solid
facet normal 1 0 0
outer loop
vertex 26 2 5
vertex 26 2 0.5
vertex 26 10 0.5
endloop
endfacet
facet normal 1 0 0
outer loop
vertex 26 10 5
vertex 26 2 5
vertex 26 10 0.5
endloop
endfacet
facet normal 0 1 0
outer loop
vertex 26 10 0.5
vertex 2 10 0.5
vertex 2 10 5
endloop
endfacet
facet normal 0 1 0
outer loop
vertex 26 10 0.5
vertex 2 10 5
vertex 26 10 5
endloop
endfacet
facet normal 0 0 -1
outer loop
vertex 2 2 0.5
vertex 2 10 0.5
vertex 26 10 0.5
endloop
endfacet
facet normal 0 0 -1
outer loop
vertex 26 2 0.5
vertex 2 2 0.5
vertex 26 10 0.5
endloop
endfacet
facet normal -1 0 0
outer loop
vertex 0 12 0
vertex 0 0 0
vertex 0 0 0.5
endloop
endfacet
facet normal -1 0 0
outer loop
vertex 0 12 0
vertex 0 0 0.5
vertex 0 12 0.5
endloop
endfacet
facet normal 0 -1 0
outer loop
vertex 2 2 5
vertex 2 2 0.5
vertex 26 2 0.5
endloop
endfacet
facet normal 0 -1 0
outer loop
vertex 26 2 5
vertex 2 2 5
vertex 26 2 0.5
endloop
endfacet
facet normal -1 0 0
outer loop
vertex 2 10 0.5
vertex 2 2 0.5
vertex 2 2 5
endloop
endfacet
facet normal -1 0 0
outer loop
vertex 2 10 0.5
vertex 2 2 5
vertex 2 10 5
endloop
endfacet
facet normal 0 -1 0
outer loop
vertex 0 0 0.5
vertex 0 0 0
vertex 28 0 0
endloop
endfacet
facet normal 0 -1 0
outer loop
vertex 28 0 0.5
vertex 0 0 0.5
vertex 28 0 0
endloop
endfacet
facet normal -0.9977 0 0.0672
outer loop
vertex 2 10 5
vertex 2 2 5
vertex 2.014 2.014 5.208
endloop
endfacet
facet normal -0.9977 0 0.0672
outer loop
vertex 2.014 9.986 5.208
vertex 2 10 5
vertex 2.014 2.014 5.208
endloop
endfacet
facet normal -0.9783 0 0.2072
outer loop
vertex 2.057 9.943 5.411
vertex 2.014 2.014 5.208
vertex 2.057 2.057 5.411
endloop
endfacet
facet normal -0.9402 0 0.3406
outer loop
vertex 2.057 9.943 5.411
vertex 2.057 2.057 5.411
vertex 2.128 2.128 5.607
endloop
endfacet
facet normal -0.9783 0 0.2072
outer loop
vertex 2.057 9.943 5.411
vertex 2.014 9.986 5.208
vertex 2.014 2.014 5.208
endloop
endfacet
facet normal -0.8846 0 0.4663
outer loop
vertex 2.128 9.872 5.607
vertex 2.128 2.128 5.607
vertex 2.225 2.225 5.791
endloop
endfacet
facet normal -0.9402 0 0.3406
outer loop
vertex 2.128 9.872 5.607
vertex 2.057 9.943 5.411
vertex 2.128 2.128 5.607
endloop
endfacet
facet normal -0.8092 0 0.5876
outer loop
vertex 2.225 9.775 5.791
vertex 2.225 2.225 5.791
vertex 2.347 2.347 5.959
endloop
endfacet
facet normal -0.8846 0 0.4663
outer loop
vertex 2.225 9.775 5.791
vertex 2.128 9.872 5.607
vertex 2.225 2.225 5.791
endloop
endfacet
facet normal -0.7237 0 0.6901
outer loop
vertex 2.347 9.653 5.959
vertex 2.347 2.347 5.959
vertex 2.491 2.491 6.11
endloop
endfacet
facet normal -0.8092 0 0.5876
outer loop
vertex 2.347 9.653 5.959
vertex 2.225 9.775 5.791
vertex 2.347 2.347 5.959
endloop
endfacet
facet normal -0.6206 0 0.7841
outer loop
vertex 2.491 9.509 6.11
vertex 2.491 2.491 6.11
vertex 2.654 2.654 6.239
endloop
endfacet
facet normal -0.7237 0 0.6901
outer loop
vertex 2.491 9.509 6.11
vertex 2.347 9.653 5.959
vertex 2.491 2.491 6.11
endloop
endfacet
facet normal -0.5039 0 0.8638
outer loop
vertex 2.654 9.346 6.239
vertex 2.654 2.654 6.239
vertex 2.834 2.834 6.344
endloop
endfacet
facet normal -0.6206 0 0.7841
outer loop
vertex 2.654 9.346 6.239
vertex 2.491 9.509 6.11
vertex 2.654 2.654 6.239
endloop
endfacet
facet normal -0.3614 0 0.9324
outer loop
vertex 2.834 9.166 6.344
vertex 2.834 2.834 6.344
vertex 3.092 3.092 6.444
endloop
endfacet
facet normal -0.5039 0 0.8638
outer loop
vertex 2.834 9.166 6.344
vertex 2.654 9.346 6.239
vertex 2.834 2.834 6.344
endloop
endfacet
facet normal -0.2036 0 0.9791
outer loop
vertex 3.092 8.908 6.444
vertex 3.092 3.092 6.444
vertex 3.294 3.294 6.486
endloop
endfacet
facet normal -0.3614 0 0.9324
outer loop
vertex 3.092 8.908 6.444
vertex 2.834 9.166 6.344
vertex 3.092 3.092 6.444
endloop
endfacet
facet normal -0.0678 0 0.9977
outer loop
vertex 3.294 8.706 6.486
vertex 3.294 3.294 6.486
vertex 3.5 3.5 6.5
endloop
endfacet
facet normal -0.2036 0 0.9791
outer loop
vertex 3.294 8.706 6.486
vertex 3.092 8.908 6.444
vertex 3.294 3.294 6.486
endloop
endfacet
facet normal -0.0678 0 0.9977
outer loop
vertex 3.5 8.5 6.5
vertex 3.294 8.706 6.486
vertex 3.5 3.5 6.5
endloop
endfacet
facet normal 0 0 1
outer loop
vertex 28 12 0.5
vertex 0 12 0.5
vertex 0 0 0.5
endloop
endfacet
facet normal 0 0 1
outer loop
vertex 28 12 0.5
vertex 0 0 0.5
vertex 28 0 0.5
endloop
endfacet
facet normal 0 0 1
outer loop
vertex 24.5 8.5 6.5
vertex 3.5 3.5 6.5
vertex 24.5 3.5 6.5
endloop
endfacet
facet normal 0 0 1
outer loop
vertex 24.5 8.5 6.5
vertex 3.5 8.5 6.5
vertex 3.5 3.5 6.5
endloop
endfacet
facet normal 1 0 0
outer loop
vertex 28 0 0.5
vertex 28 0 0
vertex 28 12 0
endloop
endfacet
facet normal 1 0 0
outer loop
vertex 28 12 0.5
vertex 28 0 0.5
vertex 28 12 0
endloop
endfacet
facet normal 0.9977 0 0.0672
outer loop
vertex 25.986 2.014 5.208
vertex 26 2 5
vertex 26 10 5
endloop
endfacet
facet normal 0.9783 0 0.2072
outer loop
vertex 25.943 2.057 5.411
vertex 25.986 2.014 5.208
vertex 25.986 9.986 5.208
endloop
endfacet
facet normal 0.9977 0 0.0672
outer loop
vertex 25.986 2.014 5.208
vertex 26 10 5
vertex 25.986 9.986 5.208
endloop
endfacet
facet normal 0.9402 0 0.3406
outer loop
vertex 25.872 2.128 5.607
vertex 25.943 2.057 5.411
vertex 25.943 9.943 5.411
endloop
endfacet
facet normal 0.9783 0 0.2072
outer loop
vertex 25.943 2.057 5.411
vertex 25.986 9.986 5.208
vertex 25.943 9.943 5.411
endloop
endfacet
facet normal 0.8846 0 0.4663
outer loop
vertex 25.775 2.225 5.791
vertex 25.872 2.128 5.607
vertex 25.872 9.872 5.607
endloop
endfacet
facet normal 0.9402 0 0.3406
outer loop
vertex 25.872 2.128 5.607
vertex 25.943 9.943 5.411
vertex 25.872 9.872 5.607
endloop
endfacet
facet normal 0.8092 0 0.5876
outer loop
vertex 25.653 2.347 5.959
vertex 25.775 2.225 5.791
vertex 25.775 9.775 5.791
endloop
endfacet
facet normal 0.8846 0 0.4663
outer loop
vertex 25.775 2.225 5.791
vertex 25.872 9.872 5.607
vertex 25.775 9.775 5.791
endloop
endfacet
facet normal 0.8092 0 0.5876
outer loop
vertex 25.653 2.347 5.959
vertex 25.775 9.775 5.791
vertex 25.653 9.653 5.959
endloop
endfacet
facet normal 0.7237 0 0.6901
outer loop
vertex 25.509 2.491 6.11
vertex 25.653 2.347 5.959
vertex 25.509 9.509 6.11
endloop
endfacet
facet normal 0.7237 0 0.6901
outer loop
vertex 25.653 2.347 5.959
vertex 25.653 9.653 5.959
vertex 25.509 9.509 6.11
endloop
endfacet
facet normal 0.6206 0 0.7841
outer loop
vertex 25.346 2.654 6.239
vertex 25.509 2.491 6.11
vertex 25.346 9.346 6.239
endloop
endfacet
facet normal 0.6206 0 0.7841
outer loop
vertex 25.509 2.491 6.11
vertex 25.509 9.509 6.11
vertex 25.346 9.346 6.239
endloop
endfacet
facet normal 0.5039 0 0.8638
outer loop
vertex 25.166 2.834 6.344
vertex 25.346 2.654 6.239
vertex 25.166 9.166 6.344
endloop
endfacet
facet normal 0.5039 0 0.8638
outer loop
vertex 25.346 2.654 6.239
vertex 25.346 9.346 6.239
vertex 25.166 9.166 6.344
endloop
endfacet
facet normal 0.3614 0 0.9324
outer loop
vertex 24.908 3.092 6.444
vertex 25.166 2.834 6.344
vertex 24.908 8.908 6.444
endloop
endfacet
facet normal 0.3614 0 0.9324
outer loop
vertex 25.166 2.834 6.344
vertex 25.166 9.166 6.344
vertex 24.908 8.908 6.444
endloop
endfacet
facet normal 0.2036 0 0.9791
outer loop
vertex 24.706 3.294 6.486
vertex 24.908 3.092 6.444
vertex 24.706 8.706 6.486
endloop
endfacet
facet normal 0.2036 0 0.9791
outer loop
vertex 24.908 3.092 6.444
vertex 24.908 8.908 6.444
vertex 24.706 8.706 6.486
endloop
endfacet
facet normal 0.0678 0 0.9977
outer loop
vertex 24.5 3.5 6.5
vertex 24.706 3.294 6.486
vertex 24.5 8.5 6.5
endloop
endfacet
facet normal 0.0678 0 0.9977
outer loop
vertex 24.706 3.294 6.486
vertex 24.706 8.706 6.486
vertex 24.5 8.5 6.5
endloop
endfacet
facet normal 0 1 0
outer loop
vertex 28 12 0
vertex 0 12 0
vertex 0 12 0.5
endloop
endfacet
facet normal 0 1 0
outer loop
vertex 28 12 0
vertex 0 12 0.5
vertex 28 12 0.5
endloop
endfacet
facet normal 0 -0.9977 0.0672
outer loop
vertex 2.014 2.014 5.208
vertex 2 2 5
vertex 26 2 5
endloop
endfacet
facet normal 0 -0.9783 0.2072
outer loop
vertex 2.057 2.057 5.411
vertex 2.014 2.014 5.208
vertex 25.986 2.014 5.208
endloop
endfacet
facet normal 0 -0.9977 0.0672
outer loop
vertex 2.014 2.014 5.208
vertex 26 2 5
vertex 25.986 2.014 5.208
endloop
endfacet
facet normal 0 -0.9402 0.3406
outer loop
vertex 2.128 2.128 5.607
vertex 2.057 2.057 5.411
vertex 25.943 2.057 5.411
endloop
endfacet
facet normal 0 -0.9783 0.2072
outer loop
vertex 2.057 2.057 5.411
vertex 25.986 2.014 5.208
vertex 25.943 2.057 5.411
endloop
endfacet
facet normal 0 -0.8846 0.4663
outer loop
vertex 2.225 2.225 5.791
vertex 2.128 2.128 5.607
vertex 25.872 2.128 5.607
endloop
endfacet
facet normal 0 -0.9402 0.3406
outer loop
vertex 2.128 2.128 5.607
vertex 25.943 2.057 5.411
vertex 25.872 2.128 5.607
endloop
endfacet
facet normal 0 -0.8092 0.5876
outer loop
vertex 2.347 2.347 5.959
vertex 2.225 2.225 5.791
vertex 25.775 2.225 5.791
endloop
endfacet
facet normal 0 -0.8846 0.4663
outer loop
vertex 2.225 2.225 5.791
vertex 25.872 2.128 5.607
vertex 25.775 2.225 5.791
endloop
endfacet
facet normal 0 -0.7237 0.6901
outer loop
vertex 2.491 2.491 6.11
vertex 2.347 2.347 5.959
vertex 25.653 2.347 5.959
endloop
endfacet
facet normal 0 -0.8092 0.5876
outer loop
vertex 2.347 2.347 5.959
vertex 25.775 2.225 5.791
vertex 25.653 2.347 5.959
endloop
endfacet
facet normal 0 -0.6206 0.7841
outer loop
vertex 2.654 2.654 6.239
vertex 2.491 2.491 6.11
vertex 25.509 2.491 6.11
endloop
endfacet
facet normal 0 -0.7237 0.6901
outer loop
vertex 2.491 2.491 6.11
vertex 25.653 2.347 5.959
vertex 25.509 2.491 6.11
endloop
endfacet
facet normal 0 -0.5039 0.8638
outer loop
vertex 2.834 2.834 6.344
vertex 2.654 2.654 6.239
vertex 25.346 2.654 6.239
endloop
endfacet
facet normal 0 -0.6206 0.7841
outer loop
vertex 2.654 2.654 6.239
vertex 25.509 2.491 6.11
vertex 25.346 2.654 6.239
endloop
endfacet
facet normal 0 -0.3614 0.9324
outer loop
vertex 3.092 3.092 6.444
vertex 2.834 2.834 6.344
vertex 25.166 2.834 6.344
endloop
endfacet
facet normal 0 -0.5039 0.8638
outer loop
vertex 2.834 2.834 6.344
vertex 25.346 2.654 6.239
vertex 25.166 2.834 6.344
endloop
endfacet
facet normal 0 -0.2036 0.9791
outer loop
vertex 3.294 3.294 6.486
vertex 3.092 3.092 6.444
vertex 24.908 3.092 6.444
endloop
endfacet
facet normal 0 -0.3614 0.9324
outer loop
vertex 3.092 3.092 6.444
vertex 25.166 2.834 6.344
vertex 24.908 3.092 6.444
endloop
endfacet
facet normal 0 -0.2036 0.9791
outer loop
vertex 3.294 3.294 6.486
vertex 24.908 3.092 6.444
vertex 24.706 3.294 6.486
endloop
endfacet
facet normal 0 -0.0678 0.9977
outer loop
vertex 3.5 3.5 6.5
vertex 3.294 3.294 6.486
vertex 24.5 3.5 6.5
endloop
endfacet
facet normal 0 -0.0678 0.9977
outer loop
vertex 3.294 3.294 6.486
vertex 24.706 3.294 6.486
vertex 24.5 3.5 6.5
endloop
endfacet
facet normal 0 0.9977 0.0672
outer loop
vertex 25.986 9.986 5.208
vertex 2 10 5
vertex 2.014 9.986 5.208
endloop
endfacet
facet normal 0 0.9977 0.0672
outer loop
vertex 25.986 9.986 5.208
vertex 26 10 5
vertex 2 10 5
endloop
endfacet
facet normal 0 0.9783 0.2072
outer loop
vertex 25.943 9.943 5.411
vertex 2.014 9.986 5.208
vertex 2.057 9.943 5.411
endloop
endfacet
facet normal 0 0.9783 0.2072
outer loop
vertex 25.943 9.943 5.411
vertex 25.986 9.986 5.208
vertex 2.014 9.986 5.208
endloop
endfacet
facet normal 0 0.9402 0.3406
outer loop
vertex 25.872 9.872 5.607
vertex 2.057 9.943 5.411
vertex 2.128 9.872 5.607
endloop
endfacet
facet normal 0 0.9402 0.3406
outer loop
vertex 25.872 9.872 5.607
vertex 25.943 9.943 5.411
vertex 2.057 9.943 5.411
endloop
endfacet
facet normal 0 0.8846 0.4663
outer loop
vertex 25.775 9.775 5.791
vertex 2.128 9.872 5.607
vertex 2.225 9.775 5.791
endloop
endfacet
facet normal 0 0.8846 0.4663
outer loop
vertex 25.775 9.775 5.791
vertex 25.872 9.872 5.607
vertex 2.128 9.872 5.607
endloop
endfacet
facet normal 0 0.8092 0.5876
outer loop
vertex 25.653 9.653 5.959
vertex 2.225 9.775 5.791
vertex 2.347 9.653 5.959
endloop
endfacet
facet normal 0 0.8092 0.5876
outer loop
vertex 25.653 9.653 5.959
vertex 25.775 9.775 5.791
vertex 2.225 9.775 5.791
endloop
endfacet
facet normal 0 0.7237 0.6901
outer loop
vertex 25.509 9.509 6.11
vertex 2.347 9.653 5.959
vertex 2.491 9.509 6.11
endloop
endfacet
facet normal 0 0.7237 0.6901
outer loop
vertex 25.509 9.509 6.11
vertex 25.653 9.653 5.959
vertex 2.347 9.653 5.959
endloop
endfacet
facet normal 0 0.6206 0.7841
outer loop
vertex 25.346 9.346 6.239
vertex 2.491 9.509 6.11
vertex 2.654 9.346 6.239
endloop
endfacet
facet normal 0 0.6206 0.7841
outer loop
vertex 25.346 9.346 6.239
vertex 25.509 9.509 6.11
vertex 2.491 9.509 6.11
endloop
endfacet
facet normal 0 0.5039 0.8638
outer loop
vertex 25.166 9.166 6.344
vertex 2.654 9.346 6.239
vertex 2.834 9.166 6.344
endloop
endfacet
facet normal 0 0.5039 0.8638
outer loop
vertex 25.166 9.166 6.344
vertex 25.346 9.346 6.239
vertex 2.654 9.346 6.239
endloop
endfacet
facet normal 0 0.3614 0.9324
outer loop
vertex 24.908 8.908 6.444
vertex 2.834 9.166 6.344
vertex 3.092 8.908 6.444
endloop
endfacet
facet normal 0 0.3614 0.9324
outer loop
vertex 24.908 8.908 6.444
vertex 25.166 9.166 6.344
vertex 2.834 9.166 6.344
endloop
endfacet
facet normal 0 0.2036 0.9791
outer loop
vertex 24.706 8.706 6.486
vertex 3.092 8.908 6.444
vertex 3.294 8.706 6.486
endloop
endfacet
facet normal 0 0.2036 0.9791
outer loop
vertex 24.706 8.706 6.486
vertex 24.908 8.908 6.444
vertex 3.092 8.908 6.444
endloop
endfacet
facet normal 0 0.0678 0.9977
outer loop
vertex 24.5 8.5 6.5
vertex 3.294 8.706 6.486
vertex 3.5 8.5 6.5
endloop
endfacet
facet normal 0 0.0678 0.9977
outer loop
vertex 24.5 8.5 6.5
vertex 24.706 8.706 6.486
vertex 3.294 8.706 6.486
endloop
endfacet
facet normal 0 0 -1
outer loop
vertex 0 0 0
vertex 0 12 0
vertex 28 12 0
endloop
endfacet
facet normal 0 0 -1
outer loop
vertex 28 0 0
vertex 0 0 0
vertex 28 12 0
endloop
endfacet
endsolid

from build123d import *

# Parameters (mm, degrees)
SKETCH_W     = 28
SKETCH_H     = 12
PAD_DEPTH    = 0.5
SKETCH001_W  = 24
SKETCH001_H  = 8
PAD001_DEPTH = 6
FILLET_R     = 1.5


with BuildPart() as pad:
    # Sketch → Pad (new body)
    with BuildSketch(Plane.XY):
        with Locations((14, 6)):
            Rectangle(SKETCH_W, SKETCH_H)
    extrude(amount=PAD_DEPTH)


with BuildPart() as fillet_body:
    # Sketch001 → Pad001 (new body)
    with BuildSketch(Plane.XY.offset(0.5)):
        with Locations((14, 6)):
            Rectangle(SKETCH001_W, SKETCH001_H)
    extrude(amount=PAD001_DEPTH)

    # Fillet
    fillet_edges = [fillet_body.edges().sort_by_distance(p)[0] for p in [
        (14, 2, 6.5),
        (26, 6, 6.5),
        (14, 10, 6.5),
        (2, 6, 6.5),
    ]]
    fillet(fillet_edges, radius=FILLET_R)


solid = Compound([pad.part, fillet_body.part])
